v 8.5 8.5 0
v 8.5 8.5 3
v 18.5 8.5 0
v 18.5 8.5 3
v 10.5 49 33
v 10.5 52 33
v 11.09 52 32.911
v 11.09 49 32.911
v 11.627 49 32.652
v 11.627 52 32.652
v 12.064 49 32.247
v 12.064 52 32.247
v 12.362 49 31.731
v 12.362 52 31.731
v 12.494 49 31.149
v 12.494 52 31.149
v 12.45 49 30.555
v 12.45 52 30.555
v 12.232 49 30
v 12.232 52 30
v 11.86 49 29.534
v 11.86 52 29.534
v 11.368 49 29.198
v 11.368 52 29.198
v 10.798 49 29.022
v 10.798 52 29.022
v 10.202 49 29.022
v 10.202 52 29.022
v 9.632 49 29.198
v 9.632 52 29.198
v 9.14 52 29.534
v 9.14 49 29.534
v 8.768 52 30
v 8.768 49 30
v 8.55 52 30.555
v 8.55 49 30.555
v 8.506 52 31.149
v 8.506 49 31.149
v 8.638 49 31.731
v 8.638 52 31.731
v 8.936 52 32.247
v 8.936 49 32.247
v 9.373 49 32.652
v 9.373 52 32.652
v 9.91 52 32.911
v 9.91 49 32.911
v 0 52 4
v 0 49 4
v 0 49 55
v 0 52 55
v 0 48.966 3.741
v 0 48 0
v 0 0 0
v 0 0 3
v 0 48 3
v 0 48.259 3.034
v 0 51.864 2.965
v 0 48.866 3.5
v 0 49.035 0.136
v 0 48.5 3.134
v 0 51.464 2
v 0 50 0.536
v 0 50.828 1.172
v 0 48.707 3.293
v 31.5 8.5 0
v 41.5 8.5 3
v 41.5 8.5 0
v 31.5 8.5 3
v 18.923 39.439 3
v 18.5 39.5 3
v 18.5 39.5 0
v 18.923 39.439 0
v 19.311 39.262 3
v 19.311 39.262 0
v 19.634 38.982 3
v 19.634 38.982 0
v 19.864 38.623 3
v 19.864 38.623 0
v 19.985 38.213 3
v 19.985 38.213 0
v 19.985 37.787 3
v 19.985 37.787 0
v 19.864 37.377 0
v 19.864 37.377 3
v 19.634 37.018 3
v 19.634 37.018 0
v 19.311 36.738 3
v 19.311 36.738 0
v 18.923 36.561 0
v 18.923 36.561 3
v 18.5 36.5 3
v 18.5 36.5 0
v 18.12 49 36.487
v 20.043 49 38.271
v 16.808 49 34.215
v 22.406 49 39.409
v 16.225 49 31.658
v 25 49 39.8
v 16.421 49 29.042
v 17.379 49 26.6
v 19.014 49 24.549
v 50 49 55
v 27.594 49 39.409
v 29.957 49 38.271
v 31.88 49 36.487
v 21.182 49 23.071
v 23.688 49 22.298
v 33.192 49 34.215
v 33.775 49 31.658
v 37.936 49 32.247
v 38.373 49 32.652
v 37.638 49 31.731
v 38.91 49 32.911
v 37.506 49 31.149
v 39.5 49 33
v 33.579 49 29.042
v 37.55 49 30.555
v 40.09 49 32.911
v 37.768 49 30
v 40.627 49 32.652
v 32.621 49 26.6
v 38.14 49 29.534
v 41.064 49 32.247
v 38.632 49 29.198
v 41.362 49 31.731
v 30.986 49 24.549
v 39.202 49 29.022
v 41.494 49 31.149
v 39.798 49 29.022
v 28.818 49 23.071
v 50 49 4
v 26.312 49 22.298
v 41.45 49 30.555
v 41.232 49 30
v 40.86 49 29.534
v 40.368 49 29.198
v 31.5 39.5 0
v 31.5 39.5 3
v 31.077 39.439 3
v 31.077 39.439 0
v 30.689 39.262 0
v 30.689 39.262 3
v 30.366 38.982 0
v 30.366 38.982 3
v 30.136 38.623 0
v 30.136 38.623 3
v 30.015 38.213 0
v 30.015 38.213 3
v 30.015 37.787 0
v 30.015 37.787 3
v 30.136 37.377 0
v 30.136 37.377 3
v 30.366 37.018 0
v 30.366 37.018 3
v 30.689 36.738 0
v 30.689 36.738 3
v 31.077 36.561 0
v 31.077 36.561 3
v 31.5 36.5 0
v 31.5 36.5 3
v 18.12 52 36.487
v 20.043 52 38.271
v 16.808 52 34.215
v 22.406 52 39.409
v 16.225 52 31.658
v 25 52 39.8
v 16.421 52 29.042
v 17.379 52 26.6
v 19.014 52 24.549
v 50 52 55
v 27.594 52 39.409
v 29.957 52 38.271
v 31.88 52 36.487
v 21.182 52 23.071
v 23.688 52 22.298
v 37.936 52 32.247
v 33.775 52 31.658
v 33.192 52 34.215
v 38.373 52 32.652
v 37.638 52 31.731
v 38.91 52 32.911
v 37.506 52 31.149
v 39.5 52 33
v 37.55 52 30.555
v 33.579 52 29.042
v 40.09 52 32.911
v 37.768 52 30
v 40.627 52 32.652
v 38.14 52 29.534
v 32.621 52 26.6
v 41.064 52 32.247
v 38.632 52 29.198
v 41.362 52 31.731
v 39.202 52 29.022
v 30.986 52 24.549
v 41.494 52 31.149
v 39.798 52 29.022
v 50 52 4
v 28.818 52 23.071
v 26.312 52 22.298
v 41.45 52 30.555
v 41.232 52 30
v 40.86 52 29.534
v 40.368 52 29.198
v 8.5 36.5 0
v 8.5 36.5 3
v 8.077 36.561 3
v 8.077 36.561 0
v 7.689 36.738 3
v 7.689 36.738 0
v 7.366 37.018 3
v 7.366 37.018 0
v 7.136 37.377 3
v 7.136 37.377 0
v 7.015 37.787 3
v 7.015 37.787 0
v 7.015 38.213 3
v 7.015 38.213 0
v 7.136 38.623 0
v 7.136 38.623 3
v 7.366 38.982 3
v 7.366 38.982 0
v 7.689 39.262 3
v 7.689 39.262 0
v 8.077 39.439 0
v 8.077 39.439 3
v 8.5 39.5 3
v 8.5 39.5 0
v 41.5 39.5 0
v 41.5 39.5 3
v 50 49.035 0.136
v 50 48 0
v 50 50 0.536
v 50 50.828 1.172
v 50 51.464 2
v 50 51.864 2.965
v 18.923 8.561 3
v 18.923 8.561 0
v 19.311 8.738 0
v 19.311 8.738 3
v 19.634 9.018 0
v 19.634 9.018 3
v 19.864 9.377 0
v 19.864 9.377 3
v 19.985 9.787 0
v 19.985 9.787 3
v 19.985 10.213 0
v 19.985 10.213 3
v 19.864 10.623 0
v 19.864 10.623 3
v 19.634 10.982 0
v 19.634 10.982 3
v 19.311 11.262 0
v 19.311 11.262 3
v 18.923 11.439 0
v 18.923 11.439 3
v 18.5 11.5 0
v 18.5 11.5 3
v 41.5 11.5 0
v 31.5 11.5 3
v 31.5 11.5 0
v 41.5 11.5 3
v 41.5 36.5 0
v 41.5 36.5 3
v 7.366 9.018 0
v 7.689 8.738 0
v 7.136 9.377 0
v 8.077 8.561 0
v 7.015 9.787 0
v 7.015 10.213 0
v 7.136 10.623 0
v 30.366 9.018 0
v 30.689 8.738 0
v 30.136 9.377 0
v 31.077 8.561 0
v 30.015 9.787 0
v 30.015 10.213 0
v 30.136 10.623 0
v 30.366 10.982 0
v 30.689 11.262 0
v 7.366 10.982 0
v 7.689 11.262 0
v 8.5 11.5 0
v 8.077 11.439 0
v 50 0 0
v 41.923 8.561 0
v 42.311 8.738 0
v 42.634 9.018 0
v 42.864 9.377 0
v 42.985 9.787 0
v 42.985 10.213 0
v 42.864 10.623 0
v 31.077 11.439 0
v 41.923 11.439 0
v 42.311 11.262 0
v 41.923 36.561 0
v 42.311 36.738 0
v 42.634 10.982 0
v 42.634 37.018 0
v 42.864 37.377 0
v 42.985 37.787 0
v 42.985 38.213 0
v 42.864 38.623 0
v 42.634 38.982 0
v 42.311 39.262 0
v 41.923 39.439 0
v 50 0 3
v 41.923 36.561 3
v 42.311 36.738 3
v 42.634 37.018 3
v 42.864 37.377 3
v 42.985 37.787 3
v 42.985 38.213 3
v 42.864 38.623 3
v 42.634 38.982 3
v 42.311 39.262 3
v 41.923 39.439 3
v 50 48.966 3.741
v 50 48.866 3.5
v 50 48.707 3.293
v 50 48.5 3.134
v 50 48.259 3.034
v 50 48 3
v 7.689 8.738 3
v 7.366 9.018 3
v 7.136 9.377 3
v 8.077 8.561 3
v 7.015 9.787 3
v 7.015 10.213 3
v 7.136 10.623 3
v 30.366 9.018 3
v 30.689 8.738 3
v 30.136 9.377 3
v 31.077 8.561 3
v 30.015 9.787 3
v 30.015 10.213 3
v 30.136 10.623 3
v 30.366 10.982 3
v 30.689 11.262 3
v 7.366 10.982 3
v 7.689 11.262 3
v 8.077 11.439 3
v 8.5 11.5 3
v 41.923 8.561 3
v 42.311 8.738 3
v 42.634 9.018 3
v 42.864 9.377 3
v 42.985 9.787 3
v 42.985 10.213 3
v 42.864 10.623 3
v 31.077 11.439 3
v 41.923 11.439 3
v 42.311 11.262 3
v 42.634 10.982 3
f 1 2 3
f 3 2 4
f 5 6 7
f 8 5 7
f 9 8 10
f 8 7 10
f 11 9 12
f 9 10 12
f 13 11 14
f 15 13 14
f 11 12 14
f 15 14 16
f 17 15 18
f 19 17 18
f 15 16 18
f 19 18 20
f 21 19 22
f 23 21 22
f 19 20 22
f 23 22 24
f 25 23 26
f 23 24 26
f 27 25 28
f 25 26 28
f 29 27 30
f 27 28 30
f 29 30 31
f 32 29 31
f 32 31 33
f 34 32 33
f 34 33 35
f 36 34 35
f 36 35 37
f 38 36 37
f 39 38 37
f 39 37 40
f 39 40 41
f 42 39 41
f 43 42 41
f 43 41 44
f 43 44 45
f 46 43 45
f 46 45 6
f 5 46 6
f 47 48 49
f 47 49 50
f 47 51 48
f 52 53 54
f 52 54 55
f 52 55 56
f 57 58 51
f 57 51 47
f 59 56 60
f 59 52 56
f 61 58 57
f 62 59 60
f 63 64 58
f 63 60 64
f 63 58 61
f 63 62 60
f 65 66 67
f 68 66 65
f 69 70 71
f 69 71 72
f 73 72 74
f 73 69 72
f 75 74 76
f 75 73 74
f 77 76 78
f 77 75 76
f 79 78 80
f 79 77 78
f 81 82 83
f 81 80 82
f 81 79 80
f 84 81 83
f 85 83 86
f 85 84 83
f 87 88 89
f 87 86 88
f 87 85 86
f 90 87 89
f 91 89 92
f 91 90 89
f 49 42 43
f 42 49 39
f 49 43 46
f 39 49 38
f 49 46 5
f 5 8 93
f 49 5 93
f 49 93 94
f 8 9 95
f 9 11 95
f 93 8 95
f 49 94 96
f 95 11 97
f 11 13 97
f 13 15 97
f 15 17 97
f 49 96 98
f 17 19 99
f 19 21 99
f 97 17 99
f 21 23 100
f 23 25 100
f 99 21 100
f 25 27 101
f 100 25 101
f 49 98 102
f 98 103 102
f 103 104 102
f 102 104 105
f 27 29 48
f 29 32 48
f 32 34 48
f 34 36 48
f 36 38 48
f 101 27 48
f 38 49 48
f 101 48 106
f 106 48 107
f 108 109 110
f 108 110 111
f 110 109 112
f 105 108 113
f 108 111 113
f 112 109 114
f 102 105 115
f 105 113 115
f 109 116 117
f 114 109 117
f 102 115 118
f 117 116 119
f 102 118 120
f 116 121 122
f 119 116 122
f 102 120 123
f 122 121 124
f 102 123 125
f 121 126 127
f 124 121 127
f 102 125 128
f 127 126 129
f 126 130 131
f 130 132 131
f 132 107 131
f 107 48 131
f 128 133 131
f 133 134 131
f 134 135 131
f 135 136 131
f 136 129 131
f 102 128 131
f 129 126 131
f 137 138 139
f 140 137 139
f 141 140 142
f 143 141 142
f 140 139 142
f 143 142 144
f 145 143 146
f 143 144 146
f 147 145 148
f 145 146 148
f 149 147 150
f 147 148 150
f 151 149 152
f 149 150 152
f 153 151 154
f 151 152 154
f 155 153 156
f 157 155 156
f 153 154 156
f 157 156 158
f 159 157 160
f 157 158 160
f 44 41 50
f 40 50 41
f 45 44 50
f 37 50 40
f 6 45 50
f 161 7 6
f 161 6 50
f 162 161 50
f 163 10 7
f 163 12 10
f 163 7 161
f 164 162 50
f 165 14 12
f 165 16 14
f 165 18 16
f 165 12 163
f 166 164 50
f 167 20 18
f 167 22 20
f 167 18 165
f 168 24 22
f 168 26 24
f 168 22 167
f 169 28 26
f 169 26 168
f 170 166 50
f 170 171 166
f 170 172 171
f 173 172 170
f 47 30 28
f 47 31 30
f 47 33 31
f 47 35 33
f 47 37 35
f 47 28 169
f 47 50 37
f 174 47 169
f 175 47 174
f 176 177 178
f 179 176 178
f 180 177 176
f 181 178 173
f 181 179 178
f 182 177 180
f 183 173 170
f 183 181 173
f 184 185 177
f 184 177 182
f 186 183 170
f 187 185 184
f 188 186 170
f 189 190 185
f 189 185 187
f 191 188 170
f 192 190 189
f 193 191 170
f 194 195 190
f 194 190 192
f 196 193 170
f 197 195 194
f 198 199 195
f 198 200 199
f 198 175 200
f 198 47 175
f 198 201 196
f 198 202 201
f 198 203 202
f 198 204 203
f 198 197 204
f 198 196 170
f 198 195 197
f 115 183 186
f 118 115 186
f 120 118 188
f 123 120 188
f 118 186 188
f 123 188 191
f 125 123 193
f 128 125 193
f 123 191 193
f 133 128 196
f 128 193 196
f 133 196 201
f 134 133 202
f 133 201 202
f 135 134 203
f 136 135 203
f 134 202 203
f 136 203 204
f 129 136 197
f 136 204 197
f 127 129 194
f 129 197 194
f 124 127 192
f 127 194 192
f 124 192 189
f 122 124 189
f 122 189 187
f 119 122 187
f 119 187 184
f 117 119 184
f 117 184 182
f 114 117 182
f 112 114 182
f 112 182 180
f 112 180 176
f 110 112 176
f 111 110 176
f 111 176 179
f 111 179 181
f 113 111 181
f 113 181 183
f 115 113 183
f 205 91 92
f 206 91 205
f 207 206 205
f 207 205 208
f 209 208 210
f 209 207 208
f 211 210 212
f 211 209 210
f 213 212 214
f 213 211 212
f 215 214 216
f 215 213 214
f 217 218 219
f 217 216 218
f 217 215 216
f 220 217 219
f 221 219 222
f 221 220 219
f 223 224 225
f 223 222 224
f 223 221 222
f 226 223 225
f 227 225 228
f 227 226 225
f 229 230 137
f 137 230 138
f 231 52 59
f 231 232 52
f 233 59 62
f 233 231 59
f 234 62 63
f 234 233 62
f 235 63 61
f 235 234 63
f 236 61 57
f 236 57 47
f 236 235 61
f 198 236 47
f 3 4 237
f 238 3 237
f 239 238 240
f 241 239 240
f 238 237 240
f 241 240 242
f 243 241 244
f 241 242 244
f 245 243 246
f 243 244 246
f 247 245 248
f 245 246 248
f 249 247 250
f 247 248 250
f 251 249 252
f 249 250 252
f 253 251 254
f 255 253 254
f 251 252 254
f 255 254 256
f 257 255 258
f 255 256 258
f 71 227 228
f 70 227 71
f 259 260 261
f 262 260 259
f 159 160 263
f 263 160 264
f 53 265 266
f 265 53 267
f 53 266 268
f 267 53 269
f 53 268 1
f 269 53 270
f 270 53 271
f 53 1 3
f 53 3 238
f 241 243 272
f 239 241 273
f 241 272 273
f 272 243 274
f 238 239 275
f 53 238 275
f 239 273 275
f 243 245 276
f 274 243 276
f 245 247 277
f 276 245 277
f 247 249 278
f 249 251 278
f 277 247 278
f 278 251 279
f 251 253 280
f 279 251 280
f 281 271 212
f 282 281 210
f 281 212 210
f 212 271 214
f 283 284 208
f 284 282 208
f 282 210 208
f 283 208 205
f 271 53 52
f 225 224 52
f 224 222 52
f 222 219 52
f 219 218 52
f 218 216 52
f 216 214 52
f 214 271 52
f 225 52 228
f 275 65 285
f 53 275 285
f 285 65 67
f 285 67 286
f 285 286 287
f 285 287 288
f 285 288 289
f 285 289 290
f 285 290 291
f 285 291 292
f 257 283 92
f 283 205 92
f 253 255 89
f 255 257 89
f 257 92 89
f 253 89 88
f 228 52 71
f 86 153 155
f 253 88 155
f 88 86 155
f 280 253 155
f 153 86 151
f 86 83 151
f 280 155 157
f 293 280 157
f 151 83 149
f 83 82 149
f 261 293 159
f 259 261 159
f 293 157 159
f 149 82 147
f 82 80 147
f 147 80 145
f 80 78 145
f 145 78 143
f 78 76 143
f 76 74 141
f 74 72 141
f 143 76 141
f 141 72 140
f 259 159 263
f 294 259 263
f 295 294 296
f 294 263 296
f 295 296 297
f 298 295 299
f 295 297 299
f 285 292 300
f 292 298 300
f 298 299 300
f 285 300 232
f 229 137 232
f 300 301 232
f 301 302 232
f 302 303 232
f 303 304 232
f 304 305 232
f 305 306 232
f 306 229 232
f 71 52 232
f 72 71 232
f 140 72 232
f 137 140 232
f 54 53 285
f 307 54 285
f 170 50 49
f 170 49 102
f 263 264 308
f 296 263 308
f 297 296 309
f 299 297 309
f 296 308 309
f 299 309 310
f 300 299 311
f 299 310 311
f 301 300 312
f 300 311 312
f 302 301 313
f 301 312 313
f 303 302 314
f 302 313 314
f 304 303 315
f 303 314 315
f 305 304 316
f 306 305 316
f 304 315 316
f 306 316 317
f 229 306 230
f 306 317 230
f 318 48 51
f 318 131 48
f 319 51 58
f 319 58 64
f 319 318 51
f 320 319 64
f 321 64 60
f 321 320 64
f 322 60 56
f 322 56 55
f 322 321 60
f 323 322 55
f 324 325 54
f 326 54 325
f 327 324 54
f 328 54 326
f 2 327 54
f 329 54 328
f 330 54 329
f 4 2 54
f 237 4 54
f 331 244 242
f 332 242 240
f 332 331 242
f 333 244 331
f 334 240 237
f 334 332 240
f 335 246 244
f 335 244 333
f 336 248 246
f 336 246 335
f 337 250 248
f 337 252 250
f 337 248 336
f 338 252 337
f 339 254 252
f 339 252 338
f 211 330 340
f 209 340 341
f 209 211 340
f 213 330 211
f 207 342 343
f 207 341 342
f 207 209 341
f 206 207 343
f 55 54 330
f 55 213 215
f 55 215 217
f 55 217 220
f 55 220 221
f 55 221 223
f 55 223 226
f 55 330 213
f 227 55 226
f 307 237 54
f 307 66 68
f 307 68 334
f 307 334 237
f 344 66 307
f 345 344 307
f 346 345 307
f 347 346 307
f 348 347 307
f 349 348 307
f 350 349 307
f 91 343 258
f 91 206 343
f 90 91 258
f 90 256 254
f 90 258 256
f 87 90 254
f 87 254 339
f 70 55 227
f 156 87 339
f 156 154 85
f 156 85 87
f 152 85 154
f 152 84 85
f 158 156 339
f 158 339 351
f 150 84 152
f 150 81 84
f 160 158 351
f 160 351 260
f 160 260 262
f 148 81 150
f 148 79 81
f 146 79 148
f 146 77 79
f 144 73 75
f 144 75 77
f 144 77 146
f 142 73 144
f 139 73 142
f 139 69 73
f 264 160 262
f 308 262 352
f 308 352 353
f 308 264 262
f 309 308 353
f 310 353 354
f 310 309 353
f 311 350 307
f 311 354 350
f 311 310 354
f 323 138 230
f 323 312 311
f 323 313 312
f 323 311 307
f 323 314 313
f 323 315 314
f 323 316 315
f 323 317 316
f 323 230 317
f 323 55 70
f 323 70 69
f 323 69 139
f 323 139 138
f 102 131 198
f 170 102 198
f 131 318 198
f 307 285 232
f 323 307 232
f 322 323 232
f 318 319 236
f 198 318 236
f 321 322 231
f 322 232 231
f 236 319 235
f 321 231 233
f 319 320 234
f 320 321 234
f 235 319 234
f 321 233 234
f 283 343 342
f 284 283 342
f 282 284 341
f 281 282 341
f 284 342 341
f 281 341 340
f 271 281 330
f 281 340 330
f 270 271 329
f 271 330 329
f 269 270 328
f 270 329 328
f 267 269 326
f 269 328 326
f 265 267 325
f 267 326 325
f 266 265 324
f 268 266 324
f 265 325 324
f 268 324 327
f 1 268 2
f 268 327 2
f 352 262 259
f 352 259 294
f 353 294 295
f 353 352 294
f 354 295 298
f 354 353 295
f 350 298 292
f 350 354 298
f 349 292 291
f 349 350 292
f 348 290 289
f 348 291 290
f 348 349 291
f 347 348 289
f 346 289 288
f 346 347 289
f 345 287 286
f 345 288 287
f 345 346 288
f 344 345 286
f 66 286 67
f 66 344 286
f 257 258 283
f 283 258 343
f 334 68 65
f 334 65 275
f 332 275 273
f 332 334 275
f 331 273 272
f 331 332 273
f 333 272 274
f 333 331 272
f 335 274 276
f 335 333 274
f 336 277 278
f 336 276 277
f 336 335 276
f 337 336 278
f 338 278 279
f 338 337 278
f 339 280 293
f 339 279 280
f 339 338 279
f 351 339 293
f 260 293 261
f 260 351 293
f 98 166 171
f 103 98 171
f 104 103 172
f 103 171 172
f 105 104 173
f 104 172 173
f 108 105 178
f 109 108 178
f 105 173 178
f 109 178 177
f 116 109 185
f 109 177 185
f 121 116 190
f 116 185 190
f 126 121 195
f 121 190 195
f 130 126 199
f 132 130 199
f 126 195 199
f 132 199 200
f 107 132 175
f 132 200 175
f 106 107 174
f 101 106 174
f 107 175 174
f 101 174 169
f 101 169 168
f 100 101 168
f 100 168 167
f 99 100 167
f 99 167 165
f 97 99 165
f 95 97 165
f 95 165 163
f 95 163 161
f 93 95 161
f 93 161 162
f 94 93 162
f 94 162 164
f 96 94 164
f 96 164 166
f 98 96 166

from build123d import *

# Parameters (mm, degrees)
SKETCH1_W           = 50
SKETCH1_H           = 52
BOSS_EXTRUDE1_DEPTH = 3
SKETCH2_W           = 50
SKETCH2_H           = 3
BOSS_EXTRUDE2_DEPTH = 52
FILLET1_R           = 4
FILLET2_R           = 1
CUT_EXTRUDE1_REACH  = 92.714
SKETCH3_R           = 2
SKETCH3_R_2         = 8.8
CUT_EXTRUDE2_REACH  = 90.927


with BuildPart() as part:
    # Sketch1 → Boss-Extrude1 (new body)
    with BuildSketch(Plane.XY):
        with Locations((25, 26)):
            Rectangle(SKETCH1_W, SKETCH1_H)
    extrude(amount=BOSS_EXTRUDE1_DEPTH)

    # Sketch2 → Boss-Extrude2 (add)
    with BuildSketch(Plane.XY.offset(3)):
        with Locations((25, 50.5)):
            Rectangle(SKETCH2_W, SKETCH2_H)
    extrude(amount=BOSS_EXTRUDE2_DEPTH)

    # Fillet1
    fillet1_edges = [part.edges().sort_by_distance(p)[0] for p in [
        (25, 52, 0),
    ]]
    fillet(fillet1_edges, radius=FILLET1_R)

    # Fillet2
    fillet2_edges = [part.edges().sort_by_distance(p)[0] for p in [
        (25, 49, 3),
    ]]
    fillet(fillet2_edges, radius=FILLET2_R)

    # Sketch3 → Cut-Extrude1 (cut, up to next)
    with BuildSketch(Plane(origin=(0, 52, 0), x_dir=(1, 0, 0), z_dir=(0, 1, 0)), mode=Mode.PRIVATE) as cut_extrude1_sk1:
        with Locations(Location((10.5, -31, 0), (0, 0, 270))):
            Circle(SKETCH3_R)
    cut_extrude1_tool1 = extrude(cut_extrude1_sk1.sketch, amount=-CUT_EXTRUDE1_REACH, mode=Mode.PRIVATE) & part.part
    # Sketch3 → Cut-Extrude1 (cut, up to next)
    with BuildSketch(Plane(origin=(0, 52, 0), x_dir=(1, 0, 0), z_dir=(0, 1, 0)), mode=Mode.PRIVATE) as cut_extrude1_sk2:
        with Locations(Location((39.5, -31, 0), (0, 0, 270))):
            Circle(SKETCH3_R)
    cut_extrude1_tool2 = extrude(cut_extrude1_sk2.sketch, amount=-CUT_EXTRUDE1_REACH, mode=Mode.PRIVATE) & part.part
    # Sketch3 → Cut-Extrude1 (cut, up to next)
    with BuildSketch(Plane(origin=(0, 52, 0), x_dir=(1, 0, 0), z_dir=(0, 1, 0)), mode=Mode.PRIVATE) as cut_extrude1_sk3:
        with Locations(Location((25, -31, 0), (0, 0, 270))):
            Circle(SKETCH3_R_2)
    cut_extrude1_tool3 = extrude(cut_extrude1_sk3.sketch, amount=-CUT_EXTRUDE1_REACH, mode=Mode.PRIVATE) & part.part
    add(cut_extrude1_tool1.solids().sort_by_distance((10.5, 52, 31))[0], mode=Mode.SUBTRACT)
    add(cut_extrude1_tool2.solids().sort_by_distance((39.5, 52, 31))[0], mode=Mode.SUBTRACT)
    add(cut_extrude1_tool3.solids().sort_by_distance((25, 52, 31))[0], mode=Mode.SUBTRACT)

    # Sketch6 → Cut-Extrude2 (cut, up to next)
    with BuildSketch(Plane.XY.offset(3), mode=Mode.PRIVATE) as cut_extrude2_sk1:
        with BuildLine():
            Line((8.5, 39.5), (18.5, 39.5))
            ThreePointArc((18.5, 39.5), (20, 38), (18.5, 36.5))
            Line((18.5, 36.5), (8.5, 36.5))
            ThreePointArc((8.5, 36.5), (7, 38), (8.5, 39.5))
        make_face()
    cut_extrude2_tool1 = extrude(cut_extrude2_sk1.sketch, amount=-CUT_EXTRUDE2_REACH, mode=Mode.PRIVATE) & part.part
    # Sketch6 → Cut-Extrude2 (cut, up to next)
    with BuildSketch(Plane.XY.offset(3), mode=Mode.PRIVATE) as cut_extrude2_sk2:
        with BuildLine():
            Line((41.5, 39.5), (31.5, 39.5))
            ThreePointArc((31.5, 39.5), (30, 38), (31.5, 36.5))
            Line((31.5, 36.5), (41.5, 36.5))
            ThreePointArc((41.5, 36.5), (43, 38), (41.5, 39.5))
        make_face()
    cut_extrude2_tool2 = extrude(cut_extrude2_sk2.sketch, amount=-CUT_EXTRUDE2_REACH, mode=Mode.PRIVATE) & part.part
    # Sketch6 → Cut-Extrude2 (cut, up to next)
    with BuildSketch(Plane.XY.offset(3), mode=Mode.PRIVATE) as cut_extrude2_sk3:
        with BuildLine():
            Line((8.5, 8.5), (18.5, 8.5))
            ThreePointArc((18.5, 8.5), (20, 10), (18.5, 11.5))
            Line((18.5, 11.5), (8.5, 11.5))
            ThreePointArc((8.5, 11.5), (7, 10), (8.5, 8.5))
        make_face()
    cut_extrude2_tool3 = extrude(cut_extrude2_sk3.sketch, amount=-CUT_EXTRUDE2_REACH, mode=Mode.PRIVATE) & part.part
    # Sketch6 → Cut-Extrude2 (cut, up to next)
    with BuildSketch(Plane.XY.offset(3), mode=Mode.PRIVATE) as cut_extrude2_sk4:
        with BuildLine():
            Line((41.5, 8.5), (31.5, 8.5))
            ThreePointArc((31.5, 8.5), (30, 10), (31.5, 11.5))
            Line((31.5, 11.5), (41.5, 11.5))
            ThreePointArc((41.5, 11.5), (43, 10), (41.5, 8.5))
        make_face()
    cut_extrude2_tool4 = extrude(cut_extrude2_sk4.sketch, amount=-CUT_EXTRUDE2_REACH, mode=Mode.PRIVATE) & part.part
    add(cut_extrude2_tool1.solids().sort_by_distance((13.5, 38, 3))[0], mode=Mode.SUBTRACT)
    add(cut_extrude2_tool2.solids().sort_by_distance((36.5, 38, 3))[0], mode=Mode.SUBTRACT)
    add(cut_extrude2_tool3.solids().sort_by_distance((13.5, 10, 3))[0], mode=Mode.SUBTRACT)
    add(cut_extrude2_tool4.solids().sort_by_distance((36.5, 10, 3))[0], mode=Mode.SUBTRACT)


solid = part.part
